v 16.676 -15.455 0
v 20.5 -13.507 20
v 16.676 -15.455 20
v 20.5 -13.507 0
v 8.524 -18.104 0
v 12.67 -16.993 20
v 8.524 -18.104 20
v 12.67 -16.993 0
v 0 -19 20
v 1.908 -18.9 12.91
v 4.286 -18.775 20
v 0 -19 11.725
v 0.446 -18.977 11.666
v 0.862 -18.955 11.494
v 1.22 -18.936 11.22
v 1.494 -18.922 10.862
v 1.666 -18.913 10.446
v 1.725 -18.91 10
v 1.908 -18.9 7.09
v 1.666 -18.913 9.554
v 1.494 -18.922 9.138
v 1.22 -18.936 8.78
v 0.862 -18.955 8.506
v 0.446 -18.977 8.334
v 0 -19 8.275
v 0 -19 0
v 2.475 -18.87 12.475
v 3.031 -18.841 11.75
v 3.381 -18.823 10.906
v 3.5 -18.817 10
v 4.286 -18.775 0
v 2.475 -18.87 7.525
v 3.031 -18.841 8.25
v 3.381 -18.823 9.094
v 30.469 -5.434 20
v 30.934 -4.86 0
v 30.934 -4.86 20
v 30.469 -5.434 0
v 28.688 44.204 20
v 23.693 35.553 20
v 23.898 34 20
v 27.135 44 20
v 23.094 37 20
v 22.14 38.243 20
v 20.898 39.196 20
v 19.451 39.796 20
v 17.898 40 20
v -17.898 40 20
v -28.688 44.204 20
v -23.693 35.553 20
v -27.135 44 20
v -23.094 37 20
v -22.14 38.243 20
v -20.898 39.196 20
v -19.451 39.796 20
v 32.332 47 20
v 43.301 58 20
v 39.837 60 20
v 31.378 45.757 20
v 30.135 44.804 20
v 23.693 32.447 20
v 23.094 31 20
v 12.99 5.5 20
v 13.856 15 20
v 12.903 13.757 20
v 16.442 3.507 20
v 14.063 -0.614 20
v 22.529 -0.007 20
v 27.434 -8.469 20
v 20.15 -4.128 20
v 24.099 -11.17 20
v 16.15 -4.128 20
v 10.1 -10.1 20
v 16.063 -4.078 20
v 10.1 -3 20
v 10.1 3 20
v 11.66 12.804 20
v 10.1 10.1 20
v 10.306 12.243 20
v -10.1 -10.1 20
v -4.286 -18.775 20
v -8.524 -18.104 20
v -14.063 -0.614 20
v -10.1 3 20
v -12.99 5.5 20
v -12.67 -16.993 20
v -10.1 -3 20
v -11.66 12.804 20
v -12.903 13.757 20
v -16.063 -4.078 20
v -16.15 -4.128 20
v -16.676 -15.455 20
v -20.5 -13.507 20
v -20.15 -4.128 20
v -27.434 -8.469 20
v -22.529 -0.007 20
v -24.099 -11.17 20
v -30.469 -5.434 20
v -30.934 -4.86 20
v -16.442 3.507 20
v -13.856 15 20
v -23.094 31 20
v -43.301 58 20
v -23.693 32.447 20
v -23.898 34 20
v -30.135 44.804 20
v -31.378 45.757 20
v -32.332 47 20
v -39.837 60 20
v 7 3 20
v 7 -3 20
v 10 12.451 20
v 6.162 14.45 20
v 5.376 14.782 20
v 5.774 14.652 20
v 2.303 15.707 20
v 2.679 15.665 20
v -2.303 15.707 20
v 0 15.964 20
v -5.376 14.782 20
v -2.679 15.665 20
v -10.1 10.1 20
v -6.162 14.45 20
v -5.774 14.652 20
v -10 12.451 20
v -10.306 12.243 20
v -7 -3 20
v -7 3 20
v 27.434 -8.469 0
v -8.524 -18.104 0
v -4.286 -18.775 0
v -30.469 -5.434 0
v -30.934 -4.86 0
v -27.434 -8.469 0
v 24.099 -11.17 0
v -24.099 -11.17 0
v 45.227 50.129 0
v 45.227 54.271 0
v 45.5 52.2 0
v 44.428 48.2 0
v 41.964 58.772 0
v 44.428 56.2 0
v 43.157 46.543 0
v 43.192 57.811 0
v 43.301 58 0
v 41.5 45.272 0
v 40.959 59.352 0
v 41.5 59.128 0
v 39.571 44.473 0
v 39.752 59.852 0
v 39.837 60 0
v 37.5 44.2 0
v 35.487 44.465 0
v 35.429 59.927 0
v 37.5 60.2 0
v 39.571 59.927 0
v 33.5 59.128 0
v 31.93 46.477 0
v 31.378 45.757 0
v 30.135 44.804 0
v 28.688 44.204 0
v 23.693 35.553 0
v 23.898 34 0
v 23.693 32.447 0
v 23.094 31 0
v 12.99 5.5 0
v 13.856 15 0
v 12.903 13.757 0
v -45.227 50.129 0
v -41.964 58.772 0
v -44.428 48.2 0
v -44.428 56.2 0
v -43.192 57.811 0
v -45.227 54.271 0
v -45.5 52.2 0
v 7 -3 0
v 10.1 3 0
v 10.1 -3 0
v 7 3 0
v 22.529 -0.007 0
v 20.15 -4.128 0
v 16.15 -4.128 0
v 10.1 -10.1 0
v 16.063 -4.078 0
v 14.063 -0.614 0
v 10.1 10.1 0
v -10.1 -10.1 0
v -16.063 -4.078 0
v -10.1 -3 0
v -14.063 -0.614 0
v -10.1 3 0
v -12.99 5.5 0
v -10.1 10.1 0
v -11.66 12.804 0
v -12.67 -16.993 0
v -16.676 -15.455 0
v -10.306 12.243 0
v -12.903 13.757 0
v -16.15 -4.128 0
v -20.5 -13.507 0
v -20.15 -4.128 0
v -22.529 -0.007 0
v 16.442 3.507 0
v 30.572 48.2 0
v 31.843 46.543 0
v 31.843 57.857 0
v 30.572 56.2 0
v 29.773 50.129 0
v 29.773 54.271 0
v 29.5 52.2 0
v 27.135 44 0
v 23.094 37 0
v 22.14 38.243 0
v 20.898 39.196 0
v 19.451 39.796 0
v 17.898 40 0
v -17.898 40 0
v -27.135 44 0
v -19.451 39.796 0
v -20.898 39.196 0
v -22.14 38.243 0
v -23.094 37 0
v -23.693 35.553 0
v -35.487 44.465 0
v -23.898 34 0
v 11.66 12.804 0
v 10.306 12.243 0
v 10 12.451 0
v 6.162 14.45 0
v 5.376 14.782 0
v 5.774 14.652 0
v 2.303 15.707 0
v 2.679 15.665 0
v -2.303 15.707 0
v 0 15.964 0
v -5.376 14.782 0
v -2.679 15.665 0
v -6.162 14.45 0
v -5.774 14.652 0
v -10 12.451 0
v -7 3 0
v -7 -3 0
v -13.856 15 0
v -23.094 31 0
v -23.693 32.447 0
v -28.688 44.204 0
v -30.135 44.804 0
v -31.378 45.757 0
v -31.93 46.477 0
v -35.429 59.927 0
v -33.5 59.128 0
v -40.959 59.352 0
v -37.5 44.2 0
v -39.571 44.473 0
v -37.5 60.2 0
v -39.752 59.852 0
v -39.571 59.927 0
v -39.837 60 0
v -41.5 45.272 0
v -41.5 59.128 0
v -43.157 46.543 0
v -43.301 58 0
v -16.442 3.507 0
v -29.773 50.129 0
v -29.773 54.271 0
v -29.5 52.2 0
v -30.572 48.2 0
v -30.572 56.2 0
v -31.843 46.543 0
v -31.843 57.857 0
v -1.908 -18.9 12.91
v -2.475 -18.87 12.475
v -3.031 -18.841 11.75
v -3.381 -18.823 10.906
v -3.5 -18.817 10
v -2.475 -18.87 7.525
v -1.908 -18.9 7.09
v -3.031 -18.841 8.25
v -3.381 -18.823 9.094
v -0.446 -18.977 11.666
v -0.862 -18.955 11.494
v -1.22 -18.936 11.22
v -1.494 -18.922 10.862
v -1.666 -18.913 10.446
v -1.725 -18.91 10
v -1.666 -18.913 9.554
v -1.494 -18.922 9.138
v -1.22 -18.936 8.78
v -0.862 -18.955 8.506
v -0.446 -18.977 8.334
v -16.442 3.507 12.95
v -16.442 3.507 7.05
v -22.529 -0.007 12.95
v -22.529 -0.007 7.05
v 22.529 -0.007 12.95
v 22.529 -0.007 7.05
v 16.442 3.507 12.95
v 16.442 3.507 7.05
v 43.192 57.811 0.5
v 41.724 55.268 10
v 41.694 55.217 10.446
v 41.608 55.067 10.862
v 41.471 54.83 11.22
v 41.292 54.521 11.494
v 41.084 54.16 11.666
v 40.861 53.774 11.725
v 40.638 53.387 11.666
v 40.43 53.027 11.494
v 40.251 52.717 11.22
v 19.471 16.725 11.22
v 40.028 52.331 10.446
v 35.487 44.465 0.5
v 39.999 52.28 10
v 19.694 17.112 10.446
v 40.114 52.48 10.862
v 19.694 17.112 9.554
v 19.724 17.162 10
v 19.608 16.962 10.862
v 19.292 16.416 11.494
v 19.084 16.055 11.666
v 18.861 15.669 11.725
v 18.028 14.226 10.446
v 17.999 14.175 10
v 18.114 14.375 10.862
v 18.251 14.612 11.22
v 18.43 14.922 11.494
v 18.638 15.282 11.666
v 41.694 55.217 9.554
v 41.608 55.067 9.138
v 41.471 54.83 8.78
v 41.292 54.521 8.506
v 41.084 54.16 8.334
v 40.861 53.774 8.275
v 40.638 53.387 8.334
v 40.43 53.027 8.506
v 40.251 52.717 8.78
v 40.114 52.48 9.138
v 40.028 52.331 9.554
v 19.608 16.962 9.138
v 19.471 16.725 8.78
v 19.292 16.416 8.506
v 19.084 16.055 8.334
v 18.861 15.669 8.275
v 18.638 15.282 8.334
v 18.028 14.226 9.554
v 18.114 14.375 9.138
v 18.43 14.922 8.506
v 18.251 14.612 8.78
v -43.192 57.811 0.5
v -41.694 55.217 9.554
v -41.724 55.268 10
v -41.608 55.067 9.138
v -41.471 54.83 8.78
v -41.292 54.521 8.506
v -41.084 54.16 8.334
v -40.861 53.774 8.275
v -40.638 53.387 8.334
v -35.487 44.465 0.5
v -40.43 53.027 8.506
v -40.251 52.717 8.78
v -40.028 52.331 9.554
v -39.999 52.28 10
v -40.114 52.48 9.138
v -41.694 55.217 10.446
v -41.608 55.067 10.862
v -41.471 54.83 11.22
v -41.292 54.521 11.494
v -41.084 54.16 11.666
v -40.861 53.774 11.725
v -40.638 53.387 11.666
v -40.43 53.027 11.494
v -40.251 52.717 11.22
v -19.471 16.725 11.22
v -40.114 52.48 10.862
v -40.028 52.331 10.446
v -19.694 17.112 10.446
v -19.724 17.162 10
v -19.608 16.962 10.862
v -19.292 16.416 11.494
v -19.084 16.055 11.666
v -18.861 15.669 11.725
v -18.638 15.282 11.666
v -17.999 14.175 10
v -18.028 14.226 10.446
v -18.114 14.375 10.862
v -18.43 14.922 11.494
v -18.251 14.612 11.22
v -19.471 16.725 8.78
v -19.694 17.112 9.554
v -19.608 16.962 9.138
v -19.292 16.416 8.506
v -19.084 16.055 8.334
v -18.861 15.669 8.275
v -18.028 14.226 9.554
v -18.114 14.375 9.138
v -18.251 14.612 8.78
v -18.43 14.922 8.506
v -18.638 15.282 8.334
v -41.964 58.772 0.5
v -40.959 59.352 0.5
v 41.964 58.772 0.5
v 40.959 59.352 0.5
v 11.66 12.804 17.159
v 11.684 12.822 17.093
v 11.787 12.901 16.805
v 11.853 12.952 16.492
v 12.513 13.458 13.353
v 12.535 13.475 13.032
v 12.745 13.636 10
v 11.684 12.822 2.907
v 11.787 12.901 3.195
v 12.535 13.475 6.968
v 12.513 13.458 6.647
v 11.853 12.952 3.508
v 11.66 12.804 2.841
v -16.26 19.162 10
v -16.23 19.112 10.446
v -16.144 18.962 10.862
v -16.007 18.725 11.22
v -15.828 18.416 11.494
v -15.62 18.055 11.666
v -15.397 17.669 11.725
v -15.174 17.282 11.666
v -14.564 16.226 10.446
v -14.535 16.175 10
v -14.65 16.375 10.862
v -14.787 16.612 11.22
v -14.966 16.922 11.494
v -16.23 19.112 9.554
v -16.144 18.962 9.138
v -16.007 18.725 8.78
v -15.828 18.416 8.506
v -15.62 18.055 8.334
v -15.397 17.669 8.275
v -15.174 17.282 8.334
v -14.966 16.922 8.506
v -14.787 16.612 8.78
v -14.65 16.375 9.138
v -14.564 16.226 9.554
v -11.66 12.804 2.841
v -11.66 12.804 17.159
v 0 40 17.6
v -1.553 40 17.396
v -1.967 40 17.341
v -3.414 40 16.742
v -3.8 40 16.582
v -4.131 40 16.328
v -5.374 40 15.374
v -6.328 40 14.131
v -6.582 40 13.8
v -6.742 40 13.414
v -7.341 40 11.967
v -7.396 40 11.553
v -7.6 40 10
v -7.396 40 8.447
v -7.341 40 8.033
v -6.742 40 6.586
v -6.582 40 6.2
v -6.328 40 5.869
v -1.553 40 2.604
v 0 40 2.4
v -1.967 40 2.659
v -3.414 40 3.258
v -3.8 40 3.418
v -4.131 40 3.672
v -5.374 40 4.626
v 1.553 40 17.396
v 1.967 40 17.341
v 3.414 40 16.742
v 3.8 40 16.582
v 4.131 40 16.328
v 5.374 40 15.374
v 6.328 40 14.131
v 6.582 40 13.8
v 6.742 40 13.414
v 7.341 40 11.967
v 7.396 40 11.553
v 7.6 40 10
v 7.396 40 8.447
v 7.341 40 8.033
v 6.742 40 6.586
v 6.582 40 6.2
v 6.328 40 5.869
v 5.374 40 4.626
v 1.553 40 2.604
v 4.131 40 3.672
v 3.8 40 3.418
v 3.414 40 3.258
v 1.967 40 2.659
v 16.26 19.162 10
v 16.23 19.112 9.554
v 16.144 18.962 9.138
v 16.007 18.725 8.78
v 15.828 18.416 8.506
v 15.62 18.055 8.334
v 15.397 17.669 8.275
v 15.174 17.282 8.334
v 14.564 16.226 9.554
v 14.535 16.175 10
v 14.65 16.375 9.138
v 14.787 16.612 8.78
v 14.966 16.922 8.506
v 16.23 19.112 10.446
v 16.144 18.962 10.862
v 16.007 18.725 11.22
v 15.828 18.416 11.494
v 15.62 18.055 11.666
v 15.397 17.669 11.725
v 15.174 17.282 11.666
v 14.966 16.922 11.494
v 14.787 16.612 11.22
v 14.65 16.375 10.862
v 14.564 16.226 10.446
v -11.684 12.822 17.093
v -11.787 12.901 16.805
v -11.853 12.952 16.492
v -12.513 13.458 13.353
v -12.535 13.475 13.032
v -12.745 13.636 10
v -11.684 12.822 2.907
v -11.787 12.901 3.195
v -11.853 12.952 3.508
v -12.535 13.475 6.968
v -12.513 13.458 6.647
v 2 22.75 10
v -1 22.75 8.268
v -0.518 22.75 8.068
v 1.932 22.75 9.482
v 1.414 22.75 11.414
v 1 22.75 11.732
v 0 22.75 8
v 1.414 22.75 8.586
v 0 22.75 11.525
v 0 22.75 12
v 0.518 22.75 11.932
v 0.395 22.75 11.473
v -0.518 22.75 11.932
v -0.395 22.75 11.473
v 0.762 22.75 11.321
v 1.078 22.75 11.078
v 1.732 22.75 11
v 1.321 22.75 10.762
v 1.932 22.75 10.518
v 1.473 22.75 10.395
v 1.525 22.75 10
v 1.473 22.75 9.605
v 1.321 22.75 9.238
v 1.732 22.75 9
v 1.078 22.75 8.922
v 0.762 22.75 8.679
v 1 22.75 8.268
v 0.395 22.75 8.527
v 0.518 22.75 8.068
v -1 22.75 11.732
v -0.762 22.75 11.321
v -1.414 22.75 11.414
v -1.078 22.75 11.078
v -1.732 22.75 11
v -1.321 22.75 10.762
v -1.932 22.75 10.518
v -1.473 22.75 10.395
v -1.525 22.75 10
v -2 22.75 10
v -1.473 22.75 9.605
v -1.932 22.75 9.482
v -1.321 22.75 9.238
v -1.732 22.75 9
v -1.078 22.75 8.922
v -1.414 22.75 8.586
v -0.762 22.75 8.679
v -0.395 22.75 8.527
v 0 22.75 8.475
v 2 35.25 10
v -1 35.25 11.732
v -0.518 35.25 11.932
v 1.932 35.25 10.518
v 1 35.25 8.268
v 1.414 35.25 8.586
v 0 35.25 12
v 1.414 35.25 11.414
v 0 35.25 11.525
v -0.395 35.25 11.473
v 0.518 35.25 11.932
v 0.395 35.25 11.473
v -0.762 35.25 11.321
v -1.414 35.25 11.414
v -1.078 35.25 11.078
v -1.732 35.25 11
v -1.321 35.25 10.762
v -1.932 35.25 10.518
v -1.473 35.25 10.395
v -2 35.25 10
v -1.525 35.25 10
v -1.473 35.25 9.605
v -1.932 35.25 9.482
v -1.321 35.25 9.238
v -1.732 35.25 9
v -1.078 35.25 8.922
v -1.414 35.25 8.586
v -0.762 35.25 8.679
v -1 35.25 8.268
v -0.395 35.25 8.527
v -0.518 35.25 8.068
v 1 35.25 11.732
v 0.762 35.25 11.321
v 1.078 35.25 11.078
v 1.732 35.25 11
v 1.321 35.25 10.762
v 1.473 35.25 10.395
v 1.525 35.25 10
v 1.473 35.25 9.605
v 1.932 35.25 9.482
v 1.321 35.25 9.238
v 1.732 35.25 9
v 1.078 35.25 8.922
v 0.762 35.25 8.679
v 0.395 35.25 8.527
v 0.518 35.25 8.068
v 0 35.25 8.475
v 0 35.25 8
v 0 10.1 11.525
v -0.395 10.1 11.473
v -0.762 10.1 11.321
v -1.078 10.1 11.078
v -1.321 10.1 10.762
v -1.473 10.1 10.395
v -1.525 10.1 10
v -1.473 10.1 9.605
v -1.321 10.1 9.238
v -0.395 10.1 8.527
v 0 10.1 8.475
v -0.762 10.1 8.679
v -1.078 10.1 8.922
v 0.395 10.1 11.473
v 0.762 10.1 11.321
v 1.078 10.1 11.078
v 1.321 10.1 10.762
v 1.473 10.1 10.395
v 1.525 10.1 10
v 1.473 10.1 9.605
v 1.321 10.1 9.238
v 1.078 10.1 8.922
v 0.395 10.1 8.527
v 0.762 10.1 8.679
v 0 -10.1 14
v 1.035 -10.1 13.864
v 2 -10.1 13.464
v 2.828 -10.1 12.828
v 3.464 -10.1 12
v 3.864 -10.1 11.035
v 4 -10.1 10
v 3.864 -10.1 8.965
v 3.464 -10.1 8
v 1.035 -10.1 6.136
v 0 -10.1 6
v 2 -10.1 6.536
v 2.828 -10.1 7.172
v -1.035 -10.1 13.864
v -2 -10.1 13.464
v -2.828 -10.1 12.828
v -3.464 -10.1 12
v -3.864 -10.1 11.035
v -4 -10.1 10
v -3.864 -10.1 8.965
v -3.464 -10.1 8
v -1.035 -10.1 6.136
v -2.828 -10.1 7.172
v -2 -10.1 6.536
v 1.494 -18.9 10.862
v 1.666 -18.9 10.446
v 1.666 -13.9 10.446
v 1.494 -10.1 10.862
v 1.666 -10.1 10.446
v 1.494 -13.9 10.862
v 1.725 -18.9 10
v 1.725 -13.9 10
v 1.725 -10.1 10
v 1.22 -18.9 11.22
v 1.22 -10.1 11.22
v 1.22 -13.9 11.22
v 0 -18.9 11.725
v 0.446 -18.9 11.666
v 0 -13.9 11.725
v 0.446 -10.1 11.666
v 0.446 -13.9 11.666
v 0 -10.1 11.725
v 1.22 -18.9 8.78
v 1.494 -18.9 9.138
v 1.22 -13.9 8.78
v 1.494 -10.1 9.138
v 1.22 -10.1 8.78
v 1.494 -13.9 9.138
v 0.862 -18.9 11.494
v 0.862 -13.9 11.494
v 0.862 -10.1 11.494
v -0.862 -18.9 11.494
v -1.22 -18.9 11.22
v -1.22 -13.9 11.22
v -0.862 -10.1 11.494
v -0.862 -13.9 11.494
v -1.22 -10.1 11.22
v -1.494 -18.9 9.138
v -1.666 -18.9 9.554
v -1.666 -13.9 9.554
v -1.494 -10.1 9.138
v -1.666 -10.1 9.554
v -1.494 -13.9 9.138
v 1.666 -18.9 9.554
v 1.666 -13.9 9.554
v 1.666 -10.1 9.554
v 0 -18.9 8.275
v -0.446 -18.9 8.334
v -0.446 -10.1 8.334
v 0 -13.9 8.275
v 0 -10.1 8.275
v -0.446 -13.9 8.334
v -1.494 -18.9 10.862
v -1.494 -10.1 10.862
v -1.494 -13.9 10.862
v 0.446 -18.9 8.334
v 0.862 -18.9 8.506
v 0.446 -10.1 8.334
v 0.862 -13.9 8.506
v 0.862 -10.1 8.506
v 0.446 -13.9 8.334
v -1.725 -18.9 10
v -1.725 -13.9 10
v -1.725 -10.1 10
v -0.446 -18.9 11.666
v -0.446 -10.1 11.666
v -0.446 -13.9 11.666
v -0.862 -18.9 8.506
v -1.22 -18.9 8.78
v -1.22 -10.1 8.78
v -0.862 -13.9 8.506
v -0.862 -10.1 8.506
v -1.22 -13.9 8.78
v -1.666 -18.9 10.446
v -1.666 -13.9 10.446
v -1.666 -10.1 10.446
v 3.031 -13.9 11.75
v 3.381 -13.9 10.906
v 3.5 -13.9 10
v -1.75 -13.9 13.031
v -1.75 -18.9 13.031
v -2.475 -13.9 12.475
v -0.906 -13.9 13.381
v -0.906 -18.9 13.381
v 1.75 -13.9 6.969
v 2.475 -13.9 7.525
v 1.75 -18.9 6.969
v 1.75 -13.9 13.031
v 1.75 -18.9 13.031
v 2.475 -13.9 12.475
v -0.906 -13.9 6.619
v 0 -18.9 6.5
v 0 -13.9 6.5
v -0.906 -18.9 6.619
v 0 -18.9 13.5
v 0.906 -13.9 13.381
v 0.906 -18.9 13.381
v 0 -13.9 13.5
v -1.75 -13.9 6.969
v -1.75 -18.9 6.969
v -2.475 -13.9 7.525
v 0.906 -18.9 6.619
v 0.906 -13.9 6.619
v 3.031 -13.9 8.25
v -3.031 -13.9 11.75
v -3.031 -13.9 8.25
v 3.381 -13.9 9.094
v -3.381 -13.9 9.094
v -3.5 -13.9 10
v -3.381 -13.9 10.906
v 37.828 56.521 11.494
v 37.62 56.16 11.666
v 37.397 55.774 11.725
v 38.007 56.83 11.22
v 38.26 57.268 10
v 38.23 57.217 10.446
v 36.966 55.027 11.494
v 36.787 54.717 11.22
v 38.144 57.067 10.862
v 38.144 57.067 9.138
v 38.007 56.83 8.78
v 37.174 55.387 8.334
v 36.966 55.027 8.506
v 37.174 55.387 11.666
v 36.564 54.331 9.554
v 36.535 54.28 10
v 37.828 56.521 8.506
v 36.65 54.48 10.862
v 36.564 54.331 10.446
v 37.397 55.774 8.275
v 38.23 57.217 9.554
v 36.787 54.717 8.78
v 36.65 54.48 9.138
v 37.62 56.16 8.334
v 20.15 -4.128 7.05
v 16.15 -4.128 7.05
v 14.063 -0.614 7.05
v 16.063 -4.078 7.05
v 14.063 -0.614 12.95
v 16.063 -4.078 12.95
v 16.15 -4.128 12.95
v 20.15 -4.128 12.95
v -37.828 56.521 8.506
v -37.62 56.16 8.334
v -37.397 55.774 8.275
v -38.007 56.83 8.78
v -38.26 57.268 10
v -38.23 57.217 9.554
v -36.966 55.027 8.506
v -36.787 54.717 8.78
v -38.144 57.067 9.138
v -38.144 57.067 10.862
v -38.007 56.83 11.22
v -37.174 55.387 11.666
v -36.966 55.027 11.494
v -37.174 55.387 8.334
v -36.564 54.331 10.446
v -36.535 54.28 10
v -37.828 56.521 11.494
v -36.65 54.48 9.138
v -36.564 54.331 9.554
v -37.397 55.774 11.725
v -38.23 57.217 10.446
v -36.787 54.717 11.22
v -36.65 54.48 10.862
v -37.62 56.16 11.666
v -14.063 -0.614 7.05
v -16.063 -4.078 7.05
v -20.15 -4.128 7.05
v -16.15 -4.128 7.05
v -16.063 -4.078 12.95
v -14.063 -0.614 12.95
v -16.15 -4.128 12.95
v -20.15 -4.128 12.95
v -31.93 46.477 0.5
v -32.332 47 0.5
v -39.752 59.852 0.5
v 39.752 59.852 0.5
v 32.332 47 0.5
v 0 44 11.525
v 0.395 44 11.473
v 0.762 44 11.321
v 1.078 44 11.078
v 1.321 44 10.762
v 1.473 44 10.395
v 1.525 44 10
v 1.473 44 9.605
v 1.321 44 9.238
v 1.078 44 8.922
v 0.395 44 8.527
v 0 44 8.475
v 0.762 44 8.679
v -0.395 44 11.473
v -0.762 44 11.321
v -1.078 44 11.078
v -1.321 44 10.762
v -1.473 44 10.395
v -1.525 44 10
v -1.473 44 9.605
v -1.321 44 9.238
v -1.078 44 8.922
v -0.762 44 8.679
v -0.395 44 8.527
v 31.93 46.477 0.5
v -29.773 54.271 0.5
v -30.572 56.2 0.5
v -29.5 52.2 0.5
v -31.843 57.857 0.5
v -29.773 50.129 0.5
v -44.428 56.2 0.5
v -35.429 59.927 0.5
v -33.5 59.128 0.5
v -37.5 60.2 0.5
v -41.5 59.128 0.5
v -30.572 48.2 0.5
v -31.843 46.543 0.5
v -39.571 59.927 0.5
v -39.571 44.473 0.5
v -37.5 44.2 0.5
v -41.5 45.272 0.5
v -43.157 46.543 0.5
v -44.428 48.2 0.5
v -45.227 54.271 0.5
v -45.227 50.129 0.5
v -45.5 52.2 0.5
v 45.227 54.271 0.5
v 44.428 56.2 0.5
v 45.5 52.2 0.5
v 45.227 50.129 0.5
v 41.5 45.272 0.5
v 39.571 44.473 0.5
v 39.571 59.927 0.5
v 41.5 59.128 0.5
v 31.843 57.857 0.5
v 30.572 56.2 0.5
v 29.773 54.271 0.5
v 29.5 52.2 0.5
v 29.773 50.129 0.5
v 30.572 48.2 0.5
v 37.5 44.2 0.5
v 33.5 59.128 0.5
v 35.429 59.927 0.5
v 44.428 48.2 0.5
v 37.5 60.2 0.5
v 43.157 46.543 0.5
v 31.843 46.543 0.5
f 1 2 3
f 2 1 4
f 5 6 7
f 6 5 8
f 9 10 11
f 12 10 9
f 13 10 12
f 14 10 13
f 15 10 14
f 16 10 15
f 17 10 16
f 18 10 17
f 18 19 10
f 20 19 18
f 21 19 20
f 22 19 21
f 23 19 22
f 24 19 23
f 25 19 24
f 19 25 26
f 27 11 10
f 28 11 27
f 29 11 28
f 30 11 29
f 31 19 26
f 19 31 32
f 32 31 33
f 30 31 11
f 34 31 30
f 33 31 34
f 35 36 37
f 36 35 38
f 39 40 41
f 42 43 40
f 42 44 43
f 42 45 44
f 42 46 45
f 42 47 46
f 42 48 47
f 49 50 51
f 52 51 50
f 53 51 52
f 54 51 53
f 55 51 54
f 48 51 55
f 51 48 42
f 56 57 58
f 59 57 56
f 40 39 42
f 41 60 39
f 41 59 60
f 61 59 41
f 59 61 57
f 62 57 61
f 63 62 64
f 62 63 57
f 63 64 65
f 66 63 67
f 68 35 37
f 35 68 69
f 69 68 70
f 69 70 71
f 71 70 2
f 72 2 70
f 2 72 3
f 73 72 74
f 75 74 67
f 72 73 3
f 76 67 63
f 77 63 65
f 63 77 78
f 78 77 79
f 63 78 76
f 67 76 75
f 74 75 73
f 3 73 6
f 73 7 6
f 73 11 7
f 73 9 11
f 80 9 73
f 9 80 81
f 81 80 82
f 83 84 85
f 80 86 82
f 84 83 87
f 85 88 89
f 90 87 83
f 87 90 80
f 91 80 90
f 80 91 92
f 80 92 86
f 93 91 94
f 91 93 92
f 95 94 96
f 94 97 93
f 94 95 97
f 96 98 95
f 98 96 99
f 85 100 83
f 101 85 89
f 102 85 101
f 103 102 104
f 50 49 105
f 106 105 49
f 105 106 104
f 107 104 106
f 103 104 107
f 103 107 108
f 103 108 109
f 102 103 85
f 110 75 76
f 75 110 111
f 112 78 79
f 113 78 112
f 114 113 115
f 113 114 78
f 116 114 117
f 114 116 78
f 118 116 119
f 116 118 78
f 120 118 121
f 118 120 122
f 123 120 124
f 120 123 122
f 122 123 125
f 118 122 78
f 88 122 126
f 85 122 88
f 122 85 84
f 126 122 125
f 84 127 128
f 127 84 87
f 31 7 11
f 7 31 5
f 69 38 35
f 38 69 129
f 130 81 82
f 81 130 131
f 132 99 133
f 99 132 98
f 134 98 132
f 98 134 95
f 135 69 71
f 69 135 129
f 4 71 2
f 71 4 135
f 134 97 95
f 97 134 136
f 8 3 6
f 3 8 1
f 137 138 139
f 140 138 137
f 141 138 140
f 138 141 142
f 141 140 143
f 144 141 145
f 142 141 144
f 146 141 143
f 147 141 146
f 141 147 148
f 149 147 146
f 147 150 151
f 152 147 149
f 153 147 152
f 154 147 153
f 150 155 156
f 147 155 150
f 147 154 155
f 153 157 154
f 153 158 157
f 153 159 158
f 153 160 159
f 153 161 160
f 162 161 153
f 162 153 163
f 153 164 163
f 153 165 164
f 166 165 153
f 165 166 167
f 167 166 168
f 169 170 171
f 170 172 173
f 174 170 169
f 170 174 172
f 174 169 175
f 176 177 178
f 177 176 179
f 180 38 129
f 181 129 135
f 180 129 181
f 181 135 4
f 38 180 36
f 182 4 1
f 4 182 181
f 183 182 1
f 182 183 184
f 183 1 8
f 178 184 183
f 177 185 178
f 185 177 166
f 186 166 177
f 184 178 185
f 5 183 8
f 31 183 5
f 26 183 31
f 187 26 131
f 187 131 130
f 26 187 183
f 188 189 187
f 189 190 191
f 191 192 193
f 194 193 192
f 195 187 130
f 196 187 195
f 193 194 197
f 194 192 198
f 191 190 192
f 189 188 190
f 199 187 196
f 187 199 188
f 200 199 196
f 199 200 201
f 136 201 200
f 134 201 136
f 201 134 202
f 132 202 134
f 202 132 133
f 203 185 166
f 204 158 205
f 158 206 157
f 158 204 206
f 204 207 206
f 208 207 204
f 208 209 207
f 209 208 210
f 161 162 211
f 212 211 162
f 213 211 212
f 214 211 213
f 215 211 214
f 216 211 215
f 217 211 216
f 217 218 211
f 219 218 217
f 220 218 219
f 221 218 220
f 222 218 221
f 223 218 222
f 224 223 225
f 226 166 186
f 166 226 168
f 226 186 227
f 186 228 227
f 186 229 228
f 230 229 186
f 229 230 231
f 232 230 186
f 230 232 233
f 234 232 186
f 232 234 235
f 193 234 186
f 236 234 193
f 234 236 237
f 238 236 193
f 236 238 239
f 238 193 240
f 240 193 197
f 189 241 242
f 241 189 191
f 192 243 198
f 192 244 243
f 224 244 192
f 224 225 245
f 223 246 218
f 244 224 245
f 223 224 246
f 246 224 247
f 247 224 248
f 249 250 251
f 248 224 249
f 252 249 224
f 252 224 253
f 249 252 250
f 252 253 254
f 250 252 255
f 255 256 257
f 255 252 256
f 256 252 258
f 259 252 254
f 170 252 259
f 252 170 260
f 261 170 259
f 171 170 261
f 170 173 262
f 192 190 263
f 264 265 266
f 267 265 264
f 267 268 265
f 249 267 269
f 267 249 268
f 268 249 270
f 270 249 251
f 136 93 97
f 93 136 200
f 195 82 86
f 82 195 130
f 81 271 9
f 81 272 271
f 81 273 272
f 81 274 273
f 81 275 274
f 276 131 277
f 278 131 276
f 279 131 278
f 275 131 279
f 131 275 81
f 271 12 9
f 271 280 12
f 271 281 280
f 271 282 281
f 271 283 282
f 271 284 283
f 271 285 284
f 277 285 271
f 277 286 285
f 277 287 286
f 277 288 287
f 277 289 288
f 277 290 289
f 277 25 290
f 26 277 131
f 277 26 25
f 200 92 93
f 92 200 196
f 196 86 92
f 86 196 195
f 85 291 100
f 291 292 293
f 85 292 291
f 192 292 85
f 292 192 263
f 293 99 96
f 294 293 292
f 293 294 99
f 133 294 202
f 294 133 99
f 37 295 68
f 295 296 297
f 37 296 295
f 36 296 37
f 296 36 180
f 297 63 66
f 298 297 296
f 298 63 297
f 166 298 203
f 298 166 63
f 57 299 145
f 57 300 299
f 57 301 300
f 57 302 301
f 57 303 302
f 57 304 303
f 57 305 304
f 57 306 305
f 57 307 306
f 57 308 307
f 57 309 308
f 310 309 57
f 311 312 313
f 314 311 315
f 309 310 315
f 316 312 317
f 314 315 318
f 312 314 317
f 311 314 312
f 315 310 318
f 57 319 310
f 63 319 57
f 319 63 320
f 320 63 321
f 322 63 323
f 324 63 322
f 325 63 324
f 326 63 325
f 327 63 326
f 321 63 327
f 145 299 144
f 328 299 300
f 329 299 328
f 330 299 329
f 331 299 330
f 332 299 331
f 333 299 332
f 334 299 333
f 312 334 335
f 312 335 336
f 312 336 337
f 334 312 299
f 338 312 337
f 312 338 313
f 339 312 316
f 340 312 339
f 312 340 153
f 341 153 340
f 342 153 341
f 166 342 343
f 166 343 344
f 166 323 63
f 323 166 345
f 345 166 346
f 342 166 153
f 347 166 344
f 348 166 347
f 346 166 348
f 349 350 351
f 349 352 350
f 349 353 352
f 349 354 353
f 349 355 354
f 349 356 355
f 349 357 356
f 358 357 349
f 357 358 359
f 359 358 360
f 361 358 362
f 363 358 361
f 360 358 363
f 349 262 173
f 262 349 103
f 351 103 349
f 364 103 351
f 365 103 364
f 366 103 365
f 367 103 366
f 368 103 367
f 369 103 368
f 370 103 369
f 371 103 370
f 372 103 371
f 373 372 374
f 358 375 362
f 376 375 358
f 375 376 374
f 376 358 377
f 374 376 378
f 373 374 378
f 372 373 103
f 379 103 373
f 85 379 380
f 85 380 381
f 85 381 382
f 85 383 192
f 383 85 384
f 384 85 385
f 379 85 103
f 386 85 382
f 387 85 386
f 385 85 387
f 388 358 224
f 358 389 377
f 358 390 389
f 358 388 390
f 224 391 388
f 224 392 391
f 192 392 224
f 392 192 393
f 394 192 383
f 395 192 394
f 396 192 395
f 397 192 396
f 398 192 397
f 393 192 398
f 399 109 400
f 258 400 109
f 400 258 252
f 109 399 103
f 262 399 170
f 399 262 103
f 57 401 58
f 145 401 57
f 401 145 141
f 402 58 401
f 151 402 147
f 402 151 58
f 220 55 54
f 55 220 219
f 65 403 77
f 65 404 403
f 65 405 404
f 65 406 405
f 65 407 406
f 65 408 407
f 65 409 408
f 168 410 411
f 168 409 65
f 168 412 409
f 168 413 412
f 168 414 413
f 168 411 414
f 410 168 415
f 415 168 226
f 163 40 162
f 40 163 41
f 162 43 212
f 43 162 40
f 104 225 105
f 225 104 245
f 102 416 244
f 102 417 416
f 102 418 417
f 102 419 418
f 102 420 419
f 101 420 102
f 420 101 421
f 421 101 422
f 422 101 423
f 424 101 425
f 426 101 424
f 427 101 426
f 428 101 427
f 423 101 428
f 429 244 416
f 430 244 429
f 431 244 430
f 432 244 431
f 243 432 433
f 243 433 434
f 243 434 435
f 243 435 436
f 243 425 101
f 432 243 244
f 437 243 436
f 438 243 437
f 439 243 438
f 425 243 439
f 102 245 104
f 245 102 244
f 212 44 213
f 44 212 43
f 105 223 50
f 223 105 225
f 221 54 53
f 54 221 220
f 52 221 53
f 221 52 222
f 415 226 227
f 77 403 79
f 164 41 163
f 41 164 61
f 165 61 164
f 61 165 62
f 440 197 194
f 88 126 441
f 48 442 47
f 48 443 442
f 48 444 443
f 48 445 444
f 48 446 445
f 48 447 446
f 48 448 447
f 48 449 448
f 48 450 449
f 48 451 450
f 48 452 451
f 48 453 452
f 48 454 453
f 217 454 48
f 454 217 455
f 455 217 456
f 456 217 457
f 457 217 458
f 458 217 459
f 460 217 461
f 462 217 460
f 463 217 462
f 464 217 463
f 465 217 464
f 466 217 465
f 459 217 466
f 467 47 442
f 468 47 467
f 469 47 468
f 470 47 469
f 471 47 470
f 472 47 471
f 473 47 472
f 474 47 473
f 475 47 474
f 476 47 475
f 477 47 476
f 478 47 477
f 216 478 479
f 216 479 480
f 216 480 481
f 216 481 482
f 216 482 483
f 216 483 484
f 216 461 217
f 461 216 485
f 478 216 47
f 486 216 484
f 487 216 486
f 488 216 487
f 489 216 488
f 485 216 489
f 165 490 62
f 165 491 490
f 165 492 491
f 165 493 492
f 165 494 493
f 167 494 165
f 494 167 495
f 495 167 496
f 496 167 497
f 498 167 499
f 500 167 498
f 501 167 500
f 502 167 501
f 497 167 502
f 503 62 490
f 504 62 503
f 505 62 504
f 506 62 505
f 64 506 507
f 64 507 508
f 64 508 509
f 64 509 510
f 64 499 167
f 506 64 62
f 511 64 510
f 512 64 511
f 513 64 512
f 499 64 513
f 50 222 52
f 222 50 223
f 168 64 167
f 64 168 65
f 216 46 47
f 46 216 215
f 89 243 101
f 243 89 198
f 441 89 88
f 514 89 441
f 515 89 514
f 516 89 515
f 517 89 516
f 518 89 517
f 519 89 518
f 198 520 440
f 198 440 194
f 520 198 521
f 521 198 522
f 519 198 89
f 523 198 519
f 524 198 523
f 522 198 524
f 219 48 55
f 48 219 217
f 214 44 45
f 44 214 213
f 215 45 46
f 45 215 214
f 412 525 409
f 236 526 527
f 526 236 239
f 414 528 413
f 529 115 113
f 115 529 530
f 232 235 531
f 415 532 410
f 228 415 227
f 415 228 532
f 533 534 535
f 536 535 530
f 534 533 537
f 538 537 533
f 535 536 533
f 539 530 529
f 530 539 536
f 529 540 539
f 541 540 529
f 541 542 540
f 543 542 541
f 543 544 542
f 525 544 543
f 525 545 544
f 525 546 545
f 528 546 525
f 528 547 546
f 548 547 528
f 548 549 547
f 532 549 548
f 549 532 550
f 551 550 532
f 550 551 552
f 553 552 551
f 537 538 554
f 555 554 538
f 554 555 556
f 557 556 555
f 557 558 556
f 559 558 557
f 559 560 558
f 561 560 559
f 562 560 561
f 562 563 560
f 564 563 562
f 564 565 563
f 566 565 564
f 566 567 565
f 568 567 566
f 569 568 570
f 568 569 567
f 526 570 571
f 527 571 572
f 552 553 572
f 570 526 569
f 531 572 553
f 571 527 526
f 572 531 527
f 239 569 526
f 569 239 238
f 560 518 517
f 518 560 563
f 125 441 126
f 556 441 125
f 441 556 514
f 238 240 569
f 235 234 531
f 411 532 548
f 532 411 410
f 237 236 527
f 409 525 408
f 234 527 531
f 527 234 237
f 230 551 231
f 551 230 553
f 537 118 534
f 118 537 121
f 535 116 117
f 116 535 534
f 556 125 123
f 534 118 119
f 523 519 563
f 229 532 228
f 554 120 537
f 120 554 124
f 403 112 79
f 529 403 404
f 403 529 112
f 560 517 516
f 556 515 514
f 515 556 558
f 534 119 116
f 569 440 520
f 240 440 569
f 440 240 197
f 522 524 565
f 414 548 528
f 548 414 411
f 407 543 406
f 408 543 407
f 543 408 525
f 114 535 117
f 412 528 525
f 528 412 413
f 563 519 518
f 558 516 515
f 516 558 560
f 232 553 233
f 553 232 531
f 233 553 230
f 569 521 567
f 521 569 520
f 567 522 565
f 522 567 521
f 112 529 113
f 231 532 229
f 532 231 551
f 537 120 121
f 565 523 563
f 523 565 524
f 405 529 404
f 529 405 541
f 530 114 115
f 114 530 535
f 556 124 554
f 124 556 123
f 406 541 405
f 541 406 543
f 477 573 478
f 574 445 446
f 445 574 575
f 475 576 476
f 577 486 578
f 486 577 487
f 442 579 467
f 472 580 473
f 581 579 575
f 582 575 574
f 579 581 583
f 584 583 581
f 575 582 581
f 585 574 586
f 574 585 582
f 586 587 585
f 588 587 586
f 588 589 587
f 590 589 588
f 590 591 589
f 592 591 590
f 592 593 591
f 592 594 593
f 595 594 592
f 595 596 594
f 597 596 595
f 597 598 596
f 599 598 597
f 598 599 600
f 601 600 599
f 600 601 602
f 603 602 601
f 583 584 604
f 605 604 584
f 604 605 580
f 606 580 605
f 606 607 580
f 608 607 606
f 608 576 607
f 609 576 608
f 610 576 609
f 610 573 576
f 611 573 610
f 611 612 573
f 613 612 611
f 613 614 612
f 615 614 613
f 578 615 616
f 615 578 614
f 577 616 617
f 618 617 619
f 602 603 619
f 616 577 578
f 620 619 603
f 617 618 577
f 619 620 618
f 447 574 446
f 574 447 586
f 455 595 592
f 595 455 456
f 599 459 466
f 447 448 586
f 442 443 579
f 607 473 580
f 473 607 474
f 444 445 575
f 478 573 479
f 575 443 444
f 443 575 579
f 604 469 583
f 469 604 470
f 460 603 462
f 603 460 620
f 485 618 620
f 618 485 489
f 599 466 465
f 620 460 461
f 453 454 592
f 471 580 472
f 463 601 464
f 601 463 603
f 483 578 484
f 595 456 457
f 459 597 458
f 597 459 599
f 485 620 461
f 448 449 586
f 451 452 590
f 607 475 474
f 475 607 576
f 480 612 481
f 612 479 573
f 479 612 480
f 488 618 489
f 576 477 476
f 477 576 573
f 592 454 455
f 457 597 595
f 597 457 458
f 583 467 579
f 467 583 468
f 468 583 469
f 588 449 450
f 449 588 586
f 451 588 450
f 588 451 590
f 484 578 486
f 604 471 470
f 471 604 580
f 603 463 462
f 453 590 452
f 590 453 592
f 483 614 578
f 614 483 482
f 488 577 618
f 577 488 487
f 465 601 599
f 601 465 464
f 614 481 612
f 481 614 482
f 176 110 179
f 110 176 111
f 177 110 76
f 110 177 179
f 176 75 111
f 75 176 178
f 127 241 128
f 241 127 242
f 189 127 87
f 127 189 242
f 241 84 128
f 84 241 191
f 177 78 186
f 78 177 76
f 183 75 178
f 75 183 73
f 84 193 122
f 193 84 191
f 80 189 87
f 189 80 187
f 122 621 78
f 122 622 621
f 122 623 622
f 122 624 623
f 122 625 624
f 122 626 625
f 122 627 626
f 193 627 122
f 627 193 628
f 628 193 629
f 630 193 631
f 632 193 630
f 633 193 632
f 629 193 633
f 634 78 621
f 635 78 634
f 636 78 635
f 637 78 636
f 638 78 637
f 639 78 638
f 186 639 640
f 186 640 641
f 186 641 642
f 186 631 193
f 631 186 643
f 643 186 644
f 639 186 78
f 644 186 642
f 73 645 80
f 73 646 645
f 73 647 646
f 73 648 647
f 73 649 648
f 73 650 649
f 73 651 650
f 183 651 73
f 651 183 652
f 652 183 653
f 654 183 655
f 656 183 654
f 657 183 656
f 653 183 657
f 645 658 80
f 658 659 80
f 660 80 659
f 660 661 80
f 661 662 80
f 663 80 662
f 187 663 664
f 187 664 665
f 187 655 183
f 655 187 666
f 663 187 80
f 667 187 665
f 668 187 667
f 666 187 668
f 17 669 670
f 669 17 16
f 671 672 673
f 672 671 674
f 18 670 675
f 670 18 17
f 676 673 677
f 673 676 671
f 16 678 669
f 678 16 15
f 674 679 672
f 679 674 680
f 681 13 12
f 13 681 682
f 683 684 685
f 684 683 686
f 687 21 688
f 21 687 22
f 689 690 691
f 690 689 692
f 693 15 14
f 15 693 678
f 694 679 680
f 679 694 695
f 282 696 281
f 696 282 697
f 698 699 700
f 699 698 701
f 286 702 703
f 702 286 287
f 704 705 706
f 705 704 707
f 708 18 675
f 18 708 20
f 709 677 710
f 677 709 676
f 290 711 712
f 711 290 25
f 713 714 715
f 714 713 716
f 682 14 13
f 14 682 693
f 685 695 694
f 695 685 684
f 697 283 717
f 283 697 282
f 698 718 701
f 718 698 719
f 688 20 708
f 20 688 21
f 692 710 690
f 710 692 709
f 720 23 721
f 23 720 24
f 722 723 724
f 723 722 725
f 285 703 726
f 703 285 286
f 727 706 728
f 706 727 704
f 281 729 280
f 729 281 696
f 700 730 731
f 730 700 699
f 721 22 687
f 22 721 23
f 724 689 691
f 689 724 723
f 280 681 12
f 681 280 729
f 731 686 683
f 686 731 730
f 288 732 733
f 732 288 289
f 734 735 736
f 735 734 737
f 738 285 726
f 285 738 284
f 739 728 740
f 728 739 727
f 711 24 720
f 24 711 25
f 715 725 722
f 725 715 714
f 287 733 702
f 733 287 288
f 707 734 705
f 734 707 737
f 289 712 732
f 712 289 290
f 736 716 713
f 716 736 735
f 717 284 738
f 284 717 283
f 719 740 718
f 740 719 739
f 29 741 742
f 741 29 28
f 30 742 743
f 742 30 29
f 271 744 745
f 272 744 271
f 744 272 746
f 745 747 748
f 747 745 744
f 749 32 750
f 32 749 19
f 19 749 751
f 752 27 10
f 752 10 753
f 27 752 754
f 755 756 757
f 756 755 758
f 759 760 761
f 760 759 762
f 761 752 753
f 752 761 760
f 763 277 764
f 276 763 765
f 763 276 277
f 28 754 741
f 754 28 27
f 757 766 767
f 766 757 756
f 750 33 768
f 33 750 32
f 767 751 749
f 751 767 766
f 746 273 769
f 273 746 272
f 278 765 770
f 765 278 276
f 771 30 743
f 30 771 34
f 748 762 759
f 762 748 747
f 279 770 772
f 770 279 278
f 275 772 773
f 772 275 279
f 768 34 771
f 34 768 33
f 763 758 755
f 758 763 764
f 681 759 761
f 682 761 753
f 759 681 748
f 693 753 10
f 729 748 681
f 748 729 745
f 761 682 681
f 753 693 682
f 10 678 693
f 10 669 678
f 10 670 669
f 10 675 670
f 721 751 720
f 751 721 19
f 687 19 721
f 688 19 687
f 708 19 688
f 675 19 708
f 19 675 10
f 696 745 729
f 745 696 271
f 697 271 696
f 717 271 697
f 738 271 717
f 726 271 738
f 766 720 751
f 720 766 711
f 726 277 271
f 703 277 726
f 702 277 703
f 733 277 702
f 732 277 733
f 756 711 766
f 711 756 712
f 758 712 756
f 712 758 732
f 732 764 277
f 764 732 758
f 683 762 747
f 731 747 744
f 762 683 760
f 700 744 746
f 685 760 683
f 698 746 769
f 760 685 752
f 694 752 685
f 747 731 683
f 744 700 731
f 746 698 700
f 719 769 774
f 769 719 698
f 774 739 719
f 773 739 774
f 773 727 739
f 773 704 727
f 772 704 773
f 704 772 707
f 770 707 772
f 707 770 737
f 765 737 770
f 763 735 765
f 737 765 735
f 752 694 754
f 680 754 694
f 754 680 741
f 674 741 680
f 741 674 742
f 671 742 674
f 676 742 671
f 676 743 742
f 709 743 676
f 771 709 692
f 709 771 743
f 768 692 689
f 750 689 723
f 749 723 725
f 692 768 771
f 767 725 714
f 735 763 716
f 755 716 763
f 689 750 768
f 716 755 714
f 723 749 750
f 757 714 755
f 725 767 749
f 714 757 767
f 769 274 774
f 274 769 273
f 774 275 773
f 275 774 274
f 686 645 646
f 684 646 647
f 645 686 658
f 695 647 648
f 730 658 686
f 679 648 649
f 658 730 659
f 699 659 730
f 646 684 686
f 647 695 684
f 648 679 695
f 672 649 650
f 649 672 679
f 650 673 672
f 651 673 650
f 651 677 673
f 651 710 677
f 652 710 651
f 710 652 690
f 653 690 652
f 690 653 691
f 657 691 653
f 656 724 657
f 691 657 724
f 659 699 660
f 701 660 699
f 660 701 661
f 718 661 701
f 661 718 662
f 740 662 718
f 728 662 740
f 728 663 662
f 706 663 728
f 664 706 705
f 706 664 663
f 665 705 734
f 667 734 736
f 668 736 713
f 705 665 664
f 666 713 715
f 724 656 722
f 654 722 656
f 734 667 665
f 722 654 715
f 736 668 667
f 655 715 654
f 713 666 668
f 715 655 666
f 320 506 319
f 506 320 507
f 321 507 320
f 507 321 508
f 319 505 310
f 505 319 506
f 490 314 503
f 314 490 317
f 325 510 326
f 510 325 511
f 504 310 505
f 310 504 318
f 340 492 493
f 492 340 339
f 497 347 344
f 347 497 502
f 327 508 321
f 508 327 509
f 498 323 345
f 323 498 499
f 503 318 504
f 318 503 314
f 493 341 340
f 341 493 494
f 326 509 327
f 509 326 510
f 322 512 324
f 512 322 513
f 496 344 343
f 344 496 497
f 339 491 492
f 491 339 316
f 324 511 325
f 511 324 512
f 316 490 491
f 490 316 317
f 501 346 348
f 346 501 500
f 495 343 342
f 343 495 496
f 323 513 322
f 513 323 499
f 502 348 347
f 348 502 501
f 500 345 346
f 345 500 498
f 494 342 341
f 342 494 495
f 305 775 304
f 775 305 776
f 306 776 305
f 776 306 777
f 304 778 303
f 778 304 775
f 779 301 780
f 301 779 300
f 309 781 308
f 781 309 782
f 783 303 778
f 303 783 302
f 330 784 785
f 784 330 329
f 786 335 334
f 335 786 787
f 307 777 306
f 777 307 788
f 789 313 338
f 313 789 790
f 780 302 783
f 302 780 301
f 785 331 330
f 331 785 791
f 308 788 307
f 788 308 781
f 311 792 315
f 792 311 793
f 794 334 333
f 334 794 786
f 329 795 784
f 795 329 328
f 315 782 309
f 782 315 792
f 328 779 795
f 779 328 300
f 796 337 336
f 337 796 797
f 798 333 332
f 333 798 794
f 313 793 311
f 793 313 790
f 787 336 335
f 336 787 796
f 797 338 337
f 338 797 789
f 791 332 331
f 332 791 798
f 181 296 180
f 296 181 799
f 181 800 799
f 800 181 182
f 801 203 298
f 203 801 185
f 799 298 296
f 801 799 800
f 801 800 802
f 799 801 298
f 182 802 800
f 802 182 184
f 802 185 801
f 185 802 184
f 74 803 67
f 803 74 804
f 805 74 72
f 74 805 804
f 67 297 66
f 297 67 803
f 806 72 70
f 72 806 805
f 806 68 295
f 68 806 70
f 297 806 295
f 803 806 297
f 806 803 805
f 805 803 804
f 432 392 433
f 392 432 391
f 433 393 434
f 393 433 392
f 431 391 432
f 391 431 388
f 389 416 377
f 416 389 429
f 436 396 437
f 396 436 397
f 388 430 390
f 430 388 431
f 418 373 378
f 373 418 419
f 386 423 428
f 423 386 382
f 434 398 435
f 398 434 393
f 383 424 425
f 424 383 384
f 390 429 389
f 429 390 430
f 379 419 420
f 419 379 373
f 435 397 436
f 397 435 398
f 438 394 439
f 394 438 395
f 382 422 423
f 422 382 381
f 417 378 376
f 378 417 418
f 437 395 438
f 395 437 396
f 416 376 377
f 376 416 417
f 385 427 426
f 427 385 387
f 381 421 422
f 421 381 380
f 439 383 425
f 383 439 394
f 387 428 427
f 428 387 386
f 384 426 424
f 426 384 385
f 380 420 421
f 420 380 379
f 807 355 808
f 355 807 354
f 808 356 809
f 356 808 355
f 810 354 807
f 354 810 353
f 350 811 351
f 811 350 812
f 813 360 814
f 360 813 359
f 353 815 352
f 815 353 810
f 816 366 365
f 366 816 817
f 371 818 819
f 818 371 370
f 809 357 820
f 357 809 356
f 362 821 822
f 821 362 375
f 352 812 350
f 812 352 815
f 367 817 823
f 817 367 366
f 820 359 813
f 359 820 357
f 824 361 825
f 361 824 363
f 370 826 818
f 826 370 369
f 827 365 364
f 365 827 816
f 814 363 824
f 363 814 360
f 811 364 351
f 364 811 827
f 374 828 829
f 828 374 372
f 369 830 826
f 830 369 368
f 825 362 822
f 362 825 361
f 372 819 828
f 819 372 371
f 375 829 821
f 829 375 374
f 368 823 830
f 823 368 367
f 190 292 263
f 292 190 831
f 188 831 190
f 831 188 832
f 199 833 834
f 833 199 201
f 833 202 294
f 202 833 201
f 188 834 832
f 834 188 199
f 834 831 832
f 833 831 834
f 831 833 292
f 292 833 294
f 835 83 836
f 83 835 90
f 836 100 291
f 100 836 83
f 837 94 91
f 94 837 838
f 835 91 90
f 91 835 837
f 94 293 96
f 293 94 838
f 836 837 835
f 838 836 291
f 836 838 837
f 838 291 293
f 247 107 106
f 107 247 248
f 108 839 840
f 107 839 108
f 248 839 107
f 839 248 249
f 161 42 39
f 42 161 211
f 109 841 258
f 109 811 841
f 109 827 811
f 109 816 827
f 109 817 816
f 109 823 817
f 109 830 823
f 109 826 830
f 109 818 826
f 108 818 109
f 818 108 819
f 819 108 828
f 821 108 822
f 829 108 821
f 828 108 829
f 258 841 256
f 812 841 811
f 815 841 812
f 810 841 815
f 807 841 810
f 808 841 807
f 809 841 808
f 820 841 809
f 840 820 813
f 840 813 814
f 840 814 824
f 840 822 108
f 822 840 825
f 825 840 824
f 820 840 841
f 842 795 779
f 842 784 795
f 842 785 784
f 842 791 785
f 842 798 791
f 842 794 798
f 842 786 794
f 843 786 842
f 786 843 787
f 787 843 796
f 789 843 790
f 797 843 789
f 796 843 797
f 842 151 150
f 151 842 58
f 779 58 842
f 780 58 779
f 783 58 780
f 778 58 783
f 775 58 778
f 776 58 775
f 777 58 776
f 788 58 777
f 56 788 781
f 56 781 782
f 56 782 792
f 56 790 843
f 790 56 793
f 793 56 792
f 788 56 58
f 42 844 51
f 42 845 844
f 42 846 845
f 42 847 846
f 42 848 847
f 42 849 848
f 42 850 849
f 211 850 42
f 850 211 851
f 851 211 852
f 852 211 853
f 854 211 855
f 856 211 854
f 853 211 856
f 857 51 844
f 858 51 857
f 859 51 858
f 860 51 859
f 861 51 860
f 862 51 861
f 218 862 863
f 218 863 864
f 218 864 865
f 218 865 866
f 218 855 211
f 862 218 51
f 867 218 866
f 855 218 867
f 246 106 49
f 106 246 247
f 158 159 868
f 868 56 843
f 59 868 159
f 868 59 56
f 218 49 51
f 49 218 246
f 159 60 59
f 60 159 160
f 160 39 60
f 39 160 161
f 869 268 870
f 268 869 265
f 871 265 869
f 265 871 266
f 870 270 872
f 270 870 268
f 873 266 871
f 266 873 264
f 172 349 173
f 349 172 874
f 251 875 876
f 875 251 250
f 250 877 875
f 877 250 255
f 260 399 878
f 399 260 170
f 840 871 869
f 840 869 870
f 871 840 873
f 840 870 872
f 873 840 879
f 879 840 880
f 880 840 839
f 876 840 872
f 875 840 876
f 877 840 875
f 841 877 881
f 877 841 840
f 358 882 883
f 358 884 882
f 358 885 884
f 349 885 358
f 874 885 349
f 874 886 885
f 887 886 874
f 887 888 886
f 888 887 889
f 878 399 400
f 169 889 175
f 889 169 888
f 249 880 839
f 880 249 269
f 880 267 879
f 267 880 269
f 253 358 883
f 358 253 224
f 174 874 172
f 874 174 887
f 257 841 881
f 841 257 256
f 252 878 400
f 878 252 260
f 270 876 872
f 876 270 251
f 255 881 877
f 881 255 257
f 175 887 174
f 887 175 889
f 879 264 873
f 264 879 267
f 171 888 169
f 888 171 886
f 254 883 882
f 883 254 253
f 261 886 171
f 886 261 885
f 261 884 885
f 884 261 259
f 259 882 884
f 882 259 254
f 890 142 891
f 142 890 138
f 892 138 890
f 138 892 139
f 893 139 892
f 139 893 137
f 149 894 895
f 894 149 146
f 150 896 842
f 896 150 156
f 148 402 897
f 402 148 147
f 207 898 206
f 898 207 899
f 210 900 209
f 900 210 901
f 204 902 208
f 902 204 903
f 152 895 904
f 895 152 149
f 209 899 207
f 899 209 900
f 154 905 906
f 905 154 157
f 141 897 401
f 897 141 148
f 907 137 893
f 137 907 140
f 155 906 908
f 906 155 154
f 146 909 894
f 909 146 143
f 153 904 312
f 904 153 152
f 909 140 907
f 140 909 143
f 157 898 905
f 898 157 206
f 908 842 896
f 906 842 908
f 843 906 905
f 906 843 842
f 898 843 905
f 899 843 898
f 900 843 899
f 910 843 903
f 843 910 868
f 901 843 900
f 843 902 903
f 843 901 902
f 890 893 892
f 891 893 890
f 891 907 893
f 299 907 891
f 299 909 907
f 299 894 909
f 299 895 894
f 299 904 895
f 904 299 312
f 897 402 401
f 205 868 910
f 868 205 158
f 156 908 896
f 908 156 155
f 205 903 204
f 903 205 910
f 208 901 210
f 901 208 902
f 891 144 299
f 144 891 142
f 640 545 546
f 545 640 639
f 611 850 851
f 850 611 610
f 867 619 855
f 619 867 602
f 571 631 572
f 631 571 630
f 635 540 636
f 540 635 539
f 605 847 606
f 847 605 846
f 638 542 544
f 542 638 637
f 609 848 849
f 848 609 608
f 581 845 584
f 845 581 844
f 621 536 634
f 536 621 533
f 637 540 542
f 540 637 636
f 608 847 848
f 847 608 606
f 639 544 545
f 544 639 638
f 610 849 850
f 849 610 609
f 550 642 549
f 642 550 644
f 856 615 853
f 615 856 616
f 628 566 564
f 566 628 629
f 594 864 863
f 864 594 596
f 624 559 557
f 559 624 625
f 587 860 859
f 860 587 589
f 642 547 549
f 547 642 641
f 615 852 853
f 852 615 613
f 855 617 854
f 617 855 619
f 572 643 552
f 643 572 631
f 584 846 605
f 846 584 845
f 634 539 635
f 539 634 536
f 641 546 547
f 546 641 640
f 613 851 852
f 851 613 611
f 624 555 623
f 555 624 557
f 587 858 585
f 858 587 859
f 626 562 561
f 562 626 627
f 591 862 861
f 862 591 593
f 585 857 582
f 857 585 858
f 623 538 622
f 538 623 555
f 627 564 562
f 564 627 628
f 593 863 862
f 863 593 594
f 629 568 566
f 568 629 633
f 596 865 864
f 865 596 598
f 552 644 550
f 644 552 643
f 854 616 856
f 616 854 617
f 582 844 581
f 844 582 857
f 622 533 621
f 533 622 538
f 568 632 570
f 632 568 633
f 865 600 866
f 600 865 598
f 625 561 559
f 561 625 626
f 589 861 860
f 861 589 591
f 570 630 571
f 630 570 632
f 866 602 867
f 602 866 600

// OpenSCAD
// file: vertex.scad
include <configuration.scad>;

$fn = 24;
roundness = 6;

module extrusion_cutout(h, extra) {
  difference() {
    cube([extrusion+extra, extrusion+extra, h], center=true);
    // we only need two insert
    for (a = [0:180:359]) rotate([0, 0, a]) {
      translate([extrusion/2, 0, 0])
        //default  depth is 2.5,for 2020 vslot  change to 6
        cube([6, 6, h+1], center=true);
    }
  }
}

module screw_socket() {
  cylinder(r=m3_wide_radius, h=20, center=true);
  translate([0, 0, 3.8]) cylinder(r=3.5, h=5);
}

module screw_socket_cone() {
  union() {
    screw_socket();
    scale([1, 1, -1]) cylinder(r1=4, r2=7, h=4);
  }
}

module vertex(height, idler_offset, idler_space) {
  union() {
    // Pads to improve print bed adhesion for slim ends.
    translate([-37.5, 52.2, -height/2]) cylinder(r=8, h=0.5);
    translate([37.5, 52.2, -height/2]) cylinder(r=8, h=0.5);
    difference() {
      union() {
        intersection() {
          translate([0, 22, 0])
				//default  r = 36,for 1515,for 2020,we change it to 36+5
            cylinder(r=41, h=height, center=true, $fn=60);
          translate([0, -37, 0]) rotate([0, 0, 30])
            cylinder(r=50, h=height+1, center=true, $fn=6);
        }
        translate([0, 38, 0]) intersection() {
          rotate([0, 0, -90])
            cylinder(r=55, h=height, center=true, $fn=3);
          translate([0, 10, 0])
            cube([100, 100, 2*height], center=true);
          translate([0, -10, 0]) rotate([0, 0, 30])
            cylinder(r=55, h=height+1, center=true, $fn=6);
        }
      }
      difference() {
        translate([0, 58, 0]) minkowski() {
          intersection() {
            rotate([0, 0, -90])
              cylinder(r=55, h=height, center=true, $fn=3);
            translate([0, -32, 0])
              cube([55, 16, 2*height], center=true);
          }
          cylinder(r=roundness, h=1, center=true);
        }
        // Idler support cones.
        translate([0, 26+idler_offset-30, 0]) rotate([-90, 0, 0])
          cylinder(r1=30, r2=2, h=30-idler_space/2);
        translate([0, 26+idler_offset+30, 0]) rotate([90, 0, 0])
          cylinder(r1=30, r2=2, h=30-idler_space/2);
      }
      translate([0, 58, 0]) minkowski() {
        intersection() {
          rotate([0, 0, -90])
            cylinder(r=55, h=height, center=true, $fn=3);
          translate([0, 7, 0])
            cube([100, 30, 2*height], center=true);
        }
        cylinder(r=roundness, h=1, center=true);
      }
      extrusion_cutout(height+10, 2*extra_radius);
      for (z = [0:30:height]) {
			//for 2020
        translate([0, -10-extra_radius, z+10-height/2]) rotate([90, 0, 0])
          screw_socket_cone();
        for (a = [-1, 1]) {
          rotate([0, 0, 30*a]) translate([-16*a, 111, z+10-height/2]) {
            // % rotate([90, 0, 0]) extrusion_cutout(200, 0);
            // Screw sockets.
            for (y = [-88, -44]) {
              translate([a*10, y, 0]) rotate([0, a*90, 0]) screw_socket();
            }
            // Nut tunnels.
	    for (z = [-1, 1]) {
	      scale([1, 1, z]) translate([0, -100, 3]) minkowski() {
	        rotate([0, 0, -a*30]) cylinder(r=4, h=16, $fn=6);
		cube([0.1, 5, 0.1], center=true);
	      }
            }
          }
        }
      }
    }
  }
}

translate([0, 0, 10]) vertex(20, idler_offset=0, idler_space=10);
// file: configuration.scad
// Increase this if your slicer or printer make holes too tight.
extra_radius = 0.1;

// OD = outside diameter, corner to corner.
m3_nut_od = 6.1;
m3_nut_radius = m3_nut_od/2 + 0.2 + extra_radius;
m3_washer_radius = 3.5 + extra_radius;

// Major diameter of metric 3mm thread.
m3_major = 2.85;
m3_radius = m3_major/2 + extra_radius;
m3_wide_radius = m3_major/2 + extra_radius + 0.2;

// NEMA17 stepper motors.
motor_shaft_diameter = 5;
motor_shaft_radius = motor_shaft_diameter/2 + extra_radius;

// Frame brackets. M3x8mm screws work best with 3.6 mm brackets.
thickness = 3.6;

// OpenBeam or Misumi. Currently only 15x15 mm, but there is a plan
// to make models more parametric and allow 20x20 mm in the future.
extrusion = 20;

// Placement for the NEMA17 stepper motors.
motor_offset = 44;
motor_length = 47;
// main file
include <configuration.scad>;

use <vertex.scad>;

$fn = 24;

module frame_top() {
  difference() {
    vertex(extrusion, idler_offset=3, idler_space=12.5);
    // M3 bolt to support idler bearings.
    translate([0, 65, 0]) rotate([90, 0, 0]) #
      cylinder(r=m3_radius, h=60);
    // Vertical belt tensioner.
  //  translate([0, 10, 0]) rotate([18, 0, 0]) union() {
   //   cylinder(r=m3_wide_radius, h=30, center=true);
   //   translate([0, -3, 8]) cube([2*m3_wide_radius, 6, 12], center=true);
   //   translate([0, 0, -2]) scale([1, 1, -1]) rotate([0, 0, 30]) #
   //     cylinder(r1=m3_nut_radius, r2=m3_nut_radius+1, h=10, $fn=6);
   // }
  }
}

translate([0, 0, 10]) frame_top();
